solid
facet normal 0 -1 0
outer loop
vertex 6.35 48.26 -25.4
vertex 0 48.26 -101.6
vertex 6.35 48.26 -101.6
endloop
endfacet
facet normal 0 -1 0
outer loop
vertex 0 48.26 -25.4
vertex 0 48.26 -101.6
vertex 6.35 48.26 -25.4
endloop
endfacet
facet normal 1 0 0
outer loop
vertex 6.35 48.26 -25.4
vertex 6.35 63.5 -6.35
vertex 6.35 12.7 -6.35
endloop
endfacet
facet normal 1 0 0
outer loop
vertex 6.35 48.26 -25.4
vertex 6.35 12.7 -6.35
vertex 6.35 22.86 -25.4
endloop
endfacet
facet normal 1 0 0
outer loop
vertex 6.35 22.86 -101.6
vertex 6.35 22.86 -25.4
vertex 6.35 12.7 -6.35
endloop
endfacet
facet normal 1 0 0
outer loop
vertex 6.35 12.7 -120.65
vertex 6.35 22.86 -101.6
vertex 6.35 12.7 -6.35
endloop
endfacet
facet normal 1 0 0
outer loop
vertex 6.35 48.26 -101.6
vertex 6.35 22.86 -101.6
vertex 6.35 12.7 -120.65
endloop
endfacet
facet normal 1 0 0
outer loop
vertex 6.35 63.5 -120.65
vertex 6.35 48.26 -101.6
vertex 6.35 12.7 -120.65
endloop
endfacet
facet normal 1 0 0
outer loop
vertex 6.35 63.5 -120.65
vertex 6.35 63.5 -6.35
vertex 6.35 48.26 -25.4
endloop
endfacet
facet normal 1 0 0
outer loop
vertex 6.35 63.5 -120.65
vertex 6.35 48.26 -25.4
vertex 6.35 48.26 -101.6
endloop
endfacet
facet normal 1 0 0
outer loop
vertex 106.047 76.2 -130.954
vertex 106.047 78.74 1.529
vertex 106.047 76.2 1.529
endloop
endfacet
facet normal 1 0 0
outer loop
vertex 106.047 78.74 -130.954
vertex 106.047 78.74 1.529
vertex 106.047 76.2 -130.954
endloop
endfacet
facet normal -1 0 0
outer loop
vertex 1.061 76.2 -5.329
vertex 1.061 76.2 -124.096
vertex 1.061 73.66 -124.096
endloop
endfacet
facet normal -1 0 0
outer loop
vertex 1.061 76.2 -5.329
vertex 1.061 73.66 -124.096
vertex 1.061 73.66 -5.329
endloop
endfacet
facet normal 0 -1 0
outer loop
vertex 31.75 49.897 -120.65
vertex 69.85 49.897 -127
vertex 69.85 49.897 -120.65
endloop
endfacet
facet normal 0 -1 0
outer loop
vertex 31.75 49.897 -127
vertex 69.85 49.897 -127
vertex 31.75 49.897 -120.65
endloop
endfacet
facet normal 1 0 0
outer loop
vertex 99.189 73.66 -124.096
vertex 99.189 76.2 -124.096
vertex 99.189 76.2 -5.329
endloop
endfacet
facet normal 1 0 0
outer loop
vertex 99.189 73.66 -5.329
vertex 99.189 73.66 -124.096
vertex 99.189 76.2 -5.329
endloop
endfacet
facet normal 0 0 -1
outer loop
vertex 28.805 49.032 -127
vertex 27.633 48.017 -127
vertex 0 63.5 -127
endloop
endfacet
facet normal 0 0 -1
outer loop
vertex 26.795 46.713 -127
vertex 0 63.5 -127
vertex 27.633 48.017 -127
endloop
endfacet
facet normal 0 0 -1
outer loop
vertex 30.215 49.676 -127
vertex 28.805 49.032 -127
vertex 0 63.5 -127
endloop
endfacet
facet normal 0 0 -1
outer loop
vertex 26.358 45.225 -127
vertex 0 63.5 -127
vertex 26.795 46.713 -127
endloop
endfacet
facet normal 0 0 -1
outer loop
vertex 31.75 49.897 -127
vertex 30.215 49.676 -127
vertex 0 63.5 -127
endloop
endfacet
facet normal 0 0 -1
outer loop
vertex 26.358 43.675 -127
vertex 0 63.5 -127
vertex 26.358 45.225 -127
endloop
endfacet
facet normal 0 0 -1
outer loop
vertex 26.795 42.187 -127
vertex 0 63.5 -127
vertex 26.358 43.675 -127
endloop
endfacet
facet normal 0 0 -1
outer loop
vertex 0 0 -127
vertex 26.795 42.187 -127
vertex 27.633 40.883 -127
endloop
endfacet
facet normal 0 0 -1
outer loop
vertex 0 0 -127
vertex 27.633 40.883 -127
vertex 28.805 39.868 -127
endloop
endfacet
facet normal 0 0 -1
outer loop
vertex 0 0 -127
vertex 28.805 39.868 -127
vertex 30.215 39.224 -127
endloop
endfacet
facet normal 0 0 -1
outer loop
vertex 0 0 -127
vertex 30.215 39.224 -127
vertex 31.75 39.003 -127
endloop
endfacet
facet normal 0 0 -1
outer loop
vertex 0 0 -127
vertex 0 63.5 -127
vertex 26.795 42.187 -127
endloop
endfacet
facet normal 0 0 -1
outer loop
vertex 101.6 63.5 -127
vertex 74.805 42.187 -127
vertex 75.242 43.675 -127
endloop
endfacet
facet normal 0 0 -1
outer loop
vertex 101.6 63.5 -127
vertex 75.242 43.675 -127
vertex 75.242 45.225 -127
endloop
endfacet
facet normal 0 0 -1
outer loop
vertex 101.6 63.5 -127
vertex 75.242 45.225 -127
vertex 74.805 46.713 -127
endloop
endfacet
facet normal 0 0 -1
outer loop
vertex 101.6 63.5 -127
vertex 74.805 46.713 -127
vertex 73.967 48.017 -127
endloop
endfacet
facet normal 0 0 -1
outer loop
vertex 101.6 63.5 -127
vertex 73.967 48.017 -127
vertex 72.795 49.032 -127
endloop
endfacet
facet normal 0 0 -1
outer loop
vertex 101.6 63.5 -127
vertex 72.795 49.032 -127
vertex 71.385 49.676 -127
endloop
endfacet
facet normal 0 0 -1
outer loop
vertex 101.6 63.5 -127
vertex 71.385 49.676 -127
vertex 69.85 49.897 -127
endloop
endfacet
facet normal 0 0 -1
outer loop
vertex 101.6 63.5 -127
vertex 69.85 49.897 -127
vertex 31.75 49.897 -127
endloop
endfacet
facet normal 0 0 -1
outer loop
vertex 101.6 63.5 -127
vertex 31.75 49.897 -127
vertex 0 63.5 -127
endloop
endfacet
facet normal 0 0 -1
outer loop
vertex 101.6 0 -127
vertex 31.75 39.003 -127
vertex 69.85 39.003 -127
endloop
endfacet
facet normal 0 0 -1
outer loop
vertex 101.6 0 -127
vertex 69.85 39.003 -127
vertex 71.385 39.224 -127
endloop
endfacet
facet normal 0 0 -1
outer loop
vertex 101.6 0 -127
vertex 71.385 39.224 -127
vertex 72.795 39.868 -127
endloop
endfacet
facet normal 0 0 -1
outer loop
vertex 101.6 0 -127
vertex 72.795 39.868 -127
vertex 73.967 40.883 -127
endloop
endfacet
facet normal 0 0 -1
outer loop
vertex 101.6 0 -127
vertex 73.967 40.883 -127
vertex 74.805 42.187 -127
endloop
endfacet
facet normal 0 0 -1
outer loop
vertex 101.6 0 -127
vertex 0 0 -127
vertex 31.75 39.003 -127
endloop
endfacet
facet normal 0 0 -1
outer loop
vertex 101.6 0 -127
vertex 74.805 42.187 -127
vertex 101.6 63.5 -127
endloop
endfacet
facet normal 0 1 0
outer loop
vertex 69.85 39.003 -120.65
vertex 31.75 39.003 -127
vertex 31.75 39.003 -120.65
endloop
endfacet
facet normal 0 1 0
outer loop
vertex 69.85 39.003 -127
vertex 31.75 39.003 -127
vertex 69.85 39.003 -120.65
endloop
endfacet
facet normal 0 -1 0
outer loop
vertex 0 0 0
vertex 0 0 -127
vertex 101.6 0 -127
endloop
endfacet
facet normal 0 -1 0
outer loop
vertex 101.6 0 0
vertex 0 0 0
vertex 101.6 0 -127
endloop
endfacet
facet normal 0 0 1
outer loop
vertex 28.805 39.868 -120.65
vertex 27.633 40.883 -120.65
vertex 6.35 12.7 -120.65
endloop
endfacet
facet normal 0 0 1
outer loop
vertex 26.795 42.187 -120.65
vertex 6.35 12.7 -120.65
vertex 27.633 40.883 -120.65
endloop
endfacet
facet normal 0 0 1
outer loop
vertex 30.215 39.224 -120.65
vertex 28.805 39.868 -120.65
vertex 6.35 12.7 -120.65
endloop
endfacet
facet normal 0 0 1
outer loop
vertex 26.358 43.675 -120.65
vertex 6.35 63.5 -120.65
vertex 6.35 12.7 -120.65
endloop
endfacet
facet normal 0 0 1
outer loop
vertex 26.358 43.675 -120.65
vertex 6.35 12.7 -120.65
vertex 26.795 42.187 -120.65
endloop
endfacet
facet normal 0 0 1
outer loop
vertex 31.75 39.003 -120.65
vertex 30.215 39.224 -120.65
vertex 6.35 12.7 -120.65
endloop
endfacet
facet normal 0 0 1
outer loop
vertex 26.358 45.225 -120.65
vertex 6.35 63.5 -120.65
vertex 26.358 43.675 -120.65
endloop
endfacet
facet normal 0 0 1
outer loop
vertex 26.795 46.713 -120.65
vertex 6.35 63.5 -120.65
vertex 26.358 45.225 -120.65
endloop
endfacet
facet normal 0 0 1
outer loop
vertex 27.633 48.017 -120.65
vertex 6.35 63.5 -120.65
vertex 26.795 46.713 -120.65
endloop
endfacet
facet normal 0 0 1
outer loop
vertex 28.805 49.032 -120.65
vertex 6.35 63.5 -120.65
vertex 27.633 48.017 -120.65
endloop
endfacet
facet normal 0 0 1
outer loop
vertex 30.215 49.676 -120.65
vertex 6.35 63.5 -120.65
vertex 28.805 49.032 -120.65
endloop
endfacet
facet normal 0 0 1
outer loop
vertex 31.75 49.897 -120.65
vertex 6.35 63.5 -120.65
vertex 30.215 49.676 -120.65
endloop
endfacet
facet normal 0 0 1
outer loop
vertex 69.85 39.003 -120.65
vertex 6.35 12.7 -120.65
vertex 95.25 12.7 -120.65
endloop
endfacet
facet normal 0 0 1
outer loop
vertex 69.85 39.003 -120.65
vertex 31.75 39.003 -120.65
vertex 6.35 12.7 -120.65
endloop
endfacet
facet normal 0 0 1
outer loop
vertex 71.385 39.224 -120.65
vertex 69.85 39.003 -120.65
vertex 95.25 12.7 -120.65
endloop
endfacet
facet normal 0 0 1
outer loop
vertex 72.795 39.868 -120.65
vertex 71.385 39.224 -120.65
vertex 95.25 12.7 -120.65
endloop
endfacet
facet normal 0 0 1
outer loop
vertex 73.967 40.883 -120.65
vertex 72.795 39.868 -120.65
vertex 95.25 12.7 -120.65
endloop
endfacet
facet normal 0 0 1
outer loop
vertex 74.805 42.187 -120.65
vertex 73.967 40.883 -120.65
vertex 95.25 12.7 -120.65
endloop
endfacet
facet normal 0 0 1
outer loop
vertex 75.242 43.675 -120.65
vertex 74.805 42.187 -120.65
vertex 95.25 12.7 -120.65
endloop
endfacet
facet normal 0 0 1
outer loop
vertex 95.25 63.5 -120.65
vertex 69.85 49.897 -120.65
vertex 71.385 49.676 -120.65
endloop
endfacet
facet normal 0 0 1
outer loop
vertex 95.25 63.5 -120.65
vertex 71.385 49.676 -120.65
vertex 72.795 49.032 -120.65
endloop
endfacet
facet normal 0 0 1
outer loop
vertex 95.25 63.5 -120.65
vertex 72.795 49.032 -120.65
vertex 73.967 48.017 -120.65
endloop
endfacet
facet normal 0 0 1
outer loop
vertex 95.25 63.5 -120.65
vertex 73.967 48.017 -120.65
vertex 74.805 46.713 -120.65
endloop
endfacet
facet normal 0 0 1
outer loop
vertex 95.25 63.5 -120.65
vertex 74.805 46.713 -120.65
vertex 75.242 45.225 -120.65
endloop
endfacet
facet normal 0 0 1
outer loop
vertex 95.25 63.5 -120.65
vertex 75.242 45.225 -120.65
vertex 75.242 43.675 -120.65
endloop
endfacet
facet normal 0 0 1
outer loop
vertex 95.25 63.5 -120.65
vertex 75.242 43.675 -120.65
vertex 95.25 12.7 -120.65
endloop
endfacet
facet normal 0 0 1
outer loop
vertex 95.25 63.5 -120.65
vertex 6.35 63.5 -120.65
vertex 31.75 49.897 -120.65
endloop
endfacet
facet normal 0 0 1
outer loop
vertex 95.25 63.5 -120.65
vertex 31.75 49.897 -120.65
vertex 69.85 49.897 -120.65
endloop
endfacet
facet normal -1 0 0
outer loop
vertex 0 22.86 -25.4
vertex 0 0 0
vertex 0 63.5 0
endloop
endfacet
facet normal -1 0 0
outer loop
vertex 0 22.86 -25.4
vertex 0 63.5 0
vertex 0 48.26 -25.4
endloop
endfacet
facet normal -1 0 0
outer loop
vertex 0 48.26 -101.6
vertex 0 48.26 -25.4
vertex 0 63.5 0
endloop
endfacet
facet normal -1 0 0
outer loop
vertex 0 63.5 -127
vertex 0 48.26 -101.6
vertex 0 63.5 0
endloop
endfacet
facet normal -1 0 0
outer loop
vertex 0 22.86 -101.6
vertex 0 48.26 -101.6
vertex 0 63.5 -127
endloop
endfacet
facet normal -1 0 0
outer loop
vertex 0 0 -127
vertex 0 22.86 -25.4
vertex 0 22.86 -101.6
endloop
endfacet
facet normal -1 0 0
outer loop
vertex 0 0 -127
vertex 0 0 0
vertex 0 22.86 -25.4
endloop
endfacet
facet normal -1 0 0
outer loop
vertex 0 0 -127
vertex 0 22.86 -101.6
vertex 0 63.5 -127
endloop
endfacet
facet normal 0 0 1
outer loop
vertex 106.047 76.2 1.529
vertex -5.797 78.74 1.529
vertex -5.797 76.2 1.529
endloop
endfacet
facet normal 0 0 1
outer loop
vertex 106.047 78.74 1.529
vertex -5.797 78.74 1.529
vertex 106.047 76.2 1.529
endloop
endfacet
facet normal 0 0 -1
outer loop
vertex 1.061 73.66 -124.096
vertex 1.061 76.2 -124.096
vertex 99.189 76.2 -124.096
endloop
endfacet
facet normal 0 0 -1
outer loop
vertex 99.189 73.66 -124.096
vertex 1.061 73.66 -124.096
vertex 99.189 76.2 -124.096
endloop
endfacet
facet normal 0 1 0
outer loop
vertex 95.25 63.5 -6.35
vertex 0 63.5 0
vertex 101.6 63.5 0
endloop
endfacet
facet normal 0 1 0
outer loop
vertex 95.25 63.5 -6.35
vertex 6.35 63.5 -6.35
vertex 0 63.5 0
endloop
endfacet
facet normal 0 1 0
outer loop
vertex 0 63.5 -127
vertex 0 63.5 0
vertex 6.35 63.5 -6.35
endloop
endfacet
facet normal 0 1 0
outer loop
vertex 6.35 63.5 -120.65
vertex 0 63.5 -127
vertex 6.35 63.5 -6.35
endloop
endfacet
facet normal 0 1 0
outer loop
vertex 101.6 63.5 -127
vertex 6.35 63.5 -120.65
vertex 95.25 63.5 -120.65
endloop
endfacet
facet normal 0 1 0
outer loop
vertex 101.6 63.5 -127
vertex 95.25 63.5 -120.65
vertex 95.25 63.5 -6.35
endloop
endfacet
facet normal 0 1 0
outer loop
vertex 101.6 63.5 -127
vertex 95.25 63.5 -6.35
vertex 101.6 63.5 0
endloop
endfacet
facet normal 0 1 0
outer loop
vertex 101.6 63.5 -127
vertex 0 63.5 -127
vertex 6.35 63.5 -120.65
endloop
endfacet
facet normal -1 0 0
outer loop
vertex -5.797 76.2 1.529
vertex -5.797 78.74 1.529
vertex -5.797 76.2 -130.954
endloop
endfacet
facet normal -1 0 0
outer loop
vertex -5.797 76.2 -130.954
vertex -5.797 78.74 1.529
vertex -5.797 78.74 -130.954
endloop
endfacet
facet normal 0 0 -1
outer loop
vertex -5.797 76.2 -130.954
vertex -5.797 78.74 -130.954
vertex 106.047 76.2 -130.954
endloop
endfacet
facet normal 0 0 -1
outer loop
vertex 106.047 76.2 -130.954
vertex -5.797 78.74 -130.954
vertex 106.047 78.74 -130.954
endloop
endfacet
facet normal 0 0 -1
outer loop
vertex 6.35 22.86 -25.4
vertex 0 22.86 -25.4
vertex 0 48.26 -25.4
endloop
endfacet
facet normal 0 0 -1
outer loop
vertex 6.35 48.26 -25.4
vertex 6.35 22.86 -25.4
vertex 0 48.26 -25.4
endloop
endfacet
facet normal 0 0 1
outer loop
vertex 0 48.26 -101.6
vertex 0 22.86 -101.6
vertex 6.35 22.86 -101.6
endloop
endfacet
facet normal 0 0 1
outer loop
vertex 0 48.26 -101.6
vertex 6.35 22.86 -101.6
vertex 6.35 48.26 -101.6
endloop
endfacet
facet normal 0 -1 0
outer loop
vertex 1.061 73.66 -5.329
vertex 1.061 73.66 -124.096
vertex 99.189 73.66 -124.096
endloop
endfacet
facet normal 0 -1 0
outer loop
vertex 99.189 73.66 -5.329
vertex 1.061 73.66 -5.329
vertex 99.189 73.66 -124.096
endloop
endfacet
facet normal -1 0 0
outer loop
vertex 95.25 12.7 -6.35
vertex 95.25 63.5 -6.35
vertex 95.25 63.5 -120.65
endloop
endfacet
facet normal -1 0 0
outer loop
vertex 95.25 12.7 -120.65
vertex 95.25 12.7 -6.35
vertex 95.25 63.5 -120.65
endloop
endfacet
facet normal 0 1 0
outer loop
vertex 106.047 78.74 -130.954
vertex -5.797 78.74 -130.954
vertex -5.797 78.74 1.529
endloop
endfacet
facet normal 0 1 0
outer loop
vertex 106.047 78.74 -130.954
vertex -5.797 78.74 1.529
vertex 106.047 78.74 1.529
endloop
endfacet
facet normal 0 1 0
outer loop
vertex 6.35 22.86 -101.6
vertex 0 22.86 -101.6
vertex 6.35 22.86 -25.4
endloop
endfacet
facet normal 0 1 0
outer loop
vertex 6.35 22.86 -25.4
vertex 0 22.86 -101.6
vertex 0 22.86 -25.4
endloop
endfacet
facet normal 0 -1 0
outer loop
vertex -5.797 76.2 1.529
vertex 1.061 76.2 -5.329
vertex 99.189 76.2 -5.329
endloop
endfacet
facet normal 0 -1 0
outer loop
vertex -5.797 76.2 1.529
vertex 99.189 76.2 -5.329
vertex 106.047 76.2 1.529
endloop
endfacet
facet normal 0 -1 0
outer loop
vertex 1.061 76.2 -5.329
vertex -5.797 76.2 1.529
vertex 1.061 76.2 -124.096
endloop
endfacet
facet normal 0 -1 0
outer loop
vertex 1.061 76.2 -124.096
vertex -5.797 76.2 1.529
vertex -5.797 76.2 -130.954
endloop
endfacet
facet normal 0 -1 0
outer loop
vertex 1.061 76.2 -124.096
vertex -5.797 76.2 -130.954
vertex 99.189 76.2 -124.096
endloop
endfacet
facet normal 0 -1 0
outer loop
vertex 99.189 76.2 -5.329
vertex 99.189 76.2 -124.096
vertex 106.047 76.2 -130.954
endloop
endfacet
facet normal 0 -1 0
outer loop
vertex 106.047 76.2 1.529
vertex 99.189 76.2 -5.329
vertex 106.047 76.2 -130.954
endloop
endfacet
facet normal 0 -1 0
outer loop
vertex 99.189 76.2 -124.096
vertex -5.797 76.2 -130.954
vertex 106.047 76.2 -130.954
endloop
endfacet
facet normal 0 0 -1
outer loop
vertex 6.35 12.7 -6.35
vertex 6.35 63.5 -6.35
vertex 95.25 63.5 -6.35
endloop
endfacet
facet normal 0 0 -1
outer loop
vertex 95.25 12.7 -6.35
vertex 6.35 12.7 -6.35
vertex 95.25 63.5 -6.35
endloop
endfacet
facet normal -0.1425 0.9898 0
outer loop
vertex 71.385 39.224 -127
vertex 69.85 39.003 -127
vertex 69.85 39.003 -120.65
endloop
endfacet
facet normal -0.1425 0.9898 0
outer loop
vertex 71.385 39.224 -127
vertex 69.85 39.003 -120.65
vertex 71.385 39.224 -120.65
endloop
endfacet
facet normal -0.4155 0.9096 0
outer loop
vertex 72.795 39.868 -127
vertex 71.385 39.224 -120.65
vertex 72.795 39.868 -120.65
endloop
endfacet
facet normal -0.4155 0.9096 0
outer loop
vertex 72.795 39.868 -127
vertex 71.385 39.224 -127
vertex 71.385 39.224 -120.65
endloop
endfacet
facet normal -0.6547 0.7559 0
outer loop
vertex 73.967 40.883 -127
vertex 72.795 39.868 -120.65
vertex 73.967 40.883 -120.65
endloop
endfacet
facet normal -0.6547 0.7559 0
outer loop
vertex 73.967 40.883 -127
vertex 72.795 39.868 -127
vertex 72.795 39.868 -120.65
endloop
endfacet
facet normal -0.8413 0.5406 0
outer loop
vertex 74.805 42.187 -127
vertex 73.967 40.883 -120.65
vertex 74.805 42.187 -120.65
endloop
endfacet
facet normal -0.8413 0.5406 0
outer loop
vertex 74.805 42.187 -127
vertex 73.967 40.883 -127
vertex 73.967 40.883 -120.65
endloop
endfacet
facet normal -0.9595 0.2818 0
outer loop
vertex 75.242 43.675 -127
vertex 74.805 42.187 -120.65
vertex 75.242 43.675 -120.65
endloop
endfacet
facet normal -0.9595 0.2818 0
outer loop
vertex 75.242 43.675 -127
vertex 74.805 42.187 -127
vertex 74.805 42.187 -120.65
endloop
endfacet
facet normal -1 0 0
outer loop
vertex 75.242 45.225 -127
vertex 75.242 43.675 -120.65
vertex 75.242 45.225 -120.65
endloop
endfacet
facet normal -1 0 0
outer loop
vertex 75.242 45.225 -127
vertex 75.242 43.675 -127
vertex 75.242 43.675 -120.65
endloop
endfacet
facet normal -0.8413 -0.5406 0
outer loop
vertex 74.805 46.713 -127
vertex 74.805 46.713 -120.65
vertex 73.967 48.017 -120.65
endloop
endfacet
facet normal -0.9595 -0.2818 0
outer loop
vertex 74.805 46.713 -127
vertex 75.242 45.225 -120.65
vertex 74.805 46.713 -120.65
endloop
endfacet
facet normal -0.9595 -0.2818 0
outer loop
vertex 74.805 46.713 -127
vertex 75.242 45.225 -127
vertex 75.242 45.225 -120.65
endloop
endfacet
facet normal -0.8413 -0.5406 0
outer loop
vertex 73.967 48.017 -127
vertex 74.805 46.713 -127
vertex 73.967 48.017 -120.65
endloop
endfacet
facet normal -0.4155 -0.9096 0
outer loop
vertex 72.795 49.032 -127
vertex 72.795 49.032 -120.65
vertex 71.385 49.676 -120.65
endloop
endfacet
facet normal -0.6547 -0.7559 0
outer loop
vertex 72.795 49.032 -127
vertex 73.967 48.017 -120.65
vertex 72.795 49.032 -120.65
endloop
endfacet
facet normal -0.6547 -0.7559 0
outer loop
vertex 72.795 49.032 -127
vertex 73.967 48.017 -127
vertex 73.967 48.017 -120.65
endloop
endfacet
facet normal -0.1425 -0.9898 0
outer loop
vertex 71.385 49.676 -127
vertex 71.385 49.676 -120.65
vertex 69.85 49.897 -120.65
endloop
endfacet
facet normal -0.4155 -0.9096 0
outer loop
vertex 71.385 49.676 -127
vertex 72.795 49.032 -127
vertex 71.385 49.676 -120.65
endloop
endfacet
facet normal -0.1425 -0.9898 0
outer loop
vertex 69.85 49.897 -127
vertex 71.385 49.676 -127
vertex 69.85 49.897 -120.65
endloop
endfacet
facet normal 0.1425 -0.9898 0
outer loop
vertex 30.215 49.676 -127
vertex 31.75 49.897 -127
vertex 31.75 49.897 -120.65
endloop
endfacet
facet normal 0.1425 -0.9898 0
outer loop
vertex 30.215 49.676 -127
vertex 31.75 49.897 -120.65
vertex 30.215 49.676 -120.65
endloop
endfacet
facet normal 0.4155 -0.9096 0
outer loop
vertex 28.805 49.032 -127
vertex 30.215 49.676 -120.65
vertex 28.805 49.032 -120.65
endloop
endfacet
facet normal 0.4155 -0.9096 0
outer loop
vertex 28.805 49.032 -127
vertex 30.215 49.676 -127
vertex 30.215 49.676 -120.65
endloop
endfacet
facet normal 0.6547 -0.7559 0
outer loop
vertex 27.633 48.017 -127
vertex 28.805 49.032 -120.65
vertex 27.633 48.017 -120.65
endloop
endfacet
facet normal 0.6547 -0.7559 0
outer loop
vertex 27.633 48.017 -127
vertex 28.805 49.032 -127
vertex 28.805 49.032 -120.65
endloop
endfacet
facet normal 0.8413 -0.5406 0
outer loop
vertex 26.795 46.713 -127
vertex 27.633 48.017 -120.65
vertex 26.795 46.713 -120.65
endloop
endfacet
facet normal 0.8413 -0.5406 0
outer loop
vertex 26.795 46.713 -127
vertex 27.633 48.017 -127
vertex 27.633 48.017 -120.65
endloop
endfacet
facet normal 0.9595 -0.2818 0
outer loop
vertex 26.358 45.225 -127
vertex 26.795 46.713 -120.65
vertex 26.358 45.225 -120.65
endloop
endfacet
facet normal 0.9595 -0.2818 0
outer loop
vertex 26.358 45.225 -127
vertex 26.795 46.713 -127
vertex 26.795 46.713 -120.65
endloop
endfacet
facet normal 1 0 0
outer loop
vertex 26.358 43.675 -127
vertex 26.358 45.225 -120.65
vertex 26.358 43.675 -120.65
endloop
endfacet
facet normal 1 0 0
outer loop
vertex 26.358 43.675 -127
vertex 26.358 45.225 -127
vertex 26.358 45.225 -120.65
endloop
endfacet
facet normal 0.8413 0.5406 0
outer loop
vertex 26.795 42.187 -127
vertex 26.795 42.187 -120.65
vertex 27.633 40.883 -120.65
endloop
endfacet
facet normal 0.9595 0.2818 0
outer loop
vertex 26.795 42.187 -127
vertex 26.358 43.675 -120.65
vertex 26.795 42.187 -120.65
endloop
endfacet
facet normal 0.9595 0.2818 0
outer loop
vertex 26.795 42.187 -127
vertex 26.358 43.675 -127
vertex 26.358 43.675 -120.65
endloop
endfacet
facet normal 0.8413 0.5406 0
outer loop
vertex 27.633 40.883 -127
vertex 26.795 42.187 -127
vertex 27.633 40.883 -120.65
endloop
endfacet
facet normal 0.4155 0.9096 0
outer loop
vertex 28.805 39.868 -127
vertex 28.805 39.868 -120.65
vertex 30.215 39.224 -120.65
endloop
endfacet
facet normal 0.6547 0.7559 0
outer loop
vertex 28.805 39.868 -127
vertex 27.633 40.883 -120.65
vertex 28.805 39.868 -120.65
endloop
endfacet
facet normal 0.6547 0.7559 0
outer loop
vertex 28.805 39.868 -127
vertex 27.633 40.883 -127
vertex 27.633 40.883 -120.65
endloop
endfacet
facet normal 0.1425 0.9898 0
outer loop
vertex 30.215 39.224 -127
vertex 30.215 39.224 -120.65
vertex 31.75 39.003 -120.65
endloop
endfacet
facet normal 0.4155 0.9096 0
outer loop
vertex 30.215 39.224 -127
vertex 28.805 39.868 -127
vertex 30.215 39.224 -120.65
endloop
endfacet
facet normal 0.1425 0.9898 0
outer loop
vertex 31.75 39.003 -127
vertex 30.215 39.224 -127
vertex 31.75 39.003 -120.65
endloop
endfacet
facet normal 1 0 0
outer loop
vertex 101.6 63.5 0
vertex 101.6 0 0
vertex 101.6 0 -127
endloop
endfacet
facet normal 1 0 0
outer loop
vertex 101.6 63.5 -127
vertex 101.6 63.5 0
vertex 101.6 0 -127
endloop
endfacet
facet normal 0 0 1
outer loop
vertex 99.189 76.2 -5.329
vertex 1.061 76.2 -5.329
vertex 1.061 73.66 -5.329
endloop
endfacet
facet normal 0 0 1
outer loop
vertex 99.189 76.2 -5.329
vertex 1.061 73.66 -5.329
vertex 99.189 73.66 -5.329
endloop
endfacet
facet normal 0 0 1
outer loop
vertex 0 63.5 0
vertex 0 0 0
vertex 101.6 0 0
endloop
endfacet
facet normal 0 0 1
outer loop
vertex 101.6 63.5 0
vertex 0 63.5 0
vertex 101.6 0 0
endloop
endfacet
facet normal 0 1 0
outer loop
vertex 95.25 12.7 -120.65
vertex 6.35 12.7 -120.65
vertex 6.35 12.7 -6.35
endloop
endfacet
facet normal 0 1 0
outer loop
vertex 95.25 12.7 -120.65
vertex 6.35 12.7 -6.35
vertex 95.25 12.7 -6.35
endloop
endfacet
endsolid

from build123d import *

# Parameters (mm, degrees)
SKETCH1_W           = 101.6
SKETCH1_H           = 127
BOSS_EXTRUDE1_DEPTH = 63.5
SKETCH2_W           = 88.9
SKETCH2_H           = 114.3
CUT_EXTRUDE1_DEPTH  = 50.8
SKETCH3_W           = 76.2
SKETCH3_H           = 25.4
CUT_EXTRUDE2_DEPTH  = 50.8
SKETCH4_W           = 111.844383113
SKETCH4_H           = 132.482449899
BOSS_EXTRUDE2_DEPTH = 2.54
SKETCH5_W           = 98.128383113
SKETCH5_H           = 118.766449899
BOSS_EXTRUDE3_DEPTH = 2.54
CUT_EXTRUDE3_DEPTH  = 7.62


with BuildPart() as part:
    # Sketch1 → Boss-Extrude1 (new body)
    with BuildSketch(Plane(origin=(0, 0, 0), x_dir=(1, 0, 0), z_dir=(0, 1, 0))):
        with Locations((50.8, 63.5)):
            Rectangle(SKETCH1_W, SKETCH1_H)
    extrude(amount=BOSS_EXTRUDE1_DEPTH)

    # Sketch2 → Cut-Extrude1 (cut)
    with BuildSketch(Plane(origin=(0, 63.5, 0), x_dir=(1, 0, 0), z_dir=(0, 1, 0))):
        with Locations((50.8, 63.5)):
            Rectangle(SKETCH2_W, SKETCH2_H)
    extrude(amount=-CUT_EXTRUDE1_DEPTH, mode=Mode.SUBTRACT)

    # Sketch3 → Cut-Extrude2 (cut)
    with BuildSketch(Plane.ZY):
        with Locations((-63.5, 35.56)):
            Rectangle(SKETCH3_W, SKETCH3_H)
    extrude(amount=-CUT_EXTRUDE2_DEPTH, mode=Mode.SUBTRACT)

    # Sketch7 → Cut-Extrude3 (cut)
    with BuildSketch(Plane(origin=(0, 0, -127), x_dir=(-1, 0, 0), z_dir=(0, 0, -1))):
        with BuildLine():
            Line((-31.75, 39.002999395), (-69.85, 39.002999395))
            ThreePointArc((-69.85, 39.002999395), (-75.297000605, 44.45), (-69.85, 49.897000605))
            Line((-69.85, 49.897000605), (-31.75, 49.897000605))
            ThreePointArc((-31.75, 49.897000605), (-26.302999395, 44.45), (-31.75, 39.002999395))
        make_face()
    extrude(amount=-CUT_EXTRUDE3_DEPTH, mode=Mode.SUBTRACT)


with BuildPart() as body_2:
    # Sketch4 → Boss-Extrude2 (new body)
    with BuildSketch(Plane(origin=(0, 78.74, 0), x_dir=(1, 0, 0), z_dir=(0, 1, 0))):
        with Locations((50.125096624, 64.712636769)):
            Rectangle(SKETCH4_W, SKETCH4_H)
    extrude(amount=-BOSS_EXTRUDE2_DEPTH)

    # Sketch5 → Boss-Extrude3 (add)
    with BuildSketch(Plane.XZ.offset(-76.2)):
        with Locations((50.125096623, -64.712636769)):
            Rectangle(SKETCH5_W, SKETCH5_H)
    extrude(amount=BOSS_EXTRUDE3_DEPTH)


solid = Compound([part.part, body_2.part])
